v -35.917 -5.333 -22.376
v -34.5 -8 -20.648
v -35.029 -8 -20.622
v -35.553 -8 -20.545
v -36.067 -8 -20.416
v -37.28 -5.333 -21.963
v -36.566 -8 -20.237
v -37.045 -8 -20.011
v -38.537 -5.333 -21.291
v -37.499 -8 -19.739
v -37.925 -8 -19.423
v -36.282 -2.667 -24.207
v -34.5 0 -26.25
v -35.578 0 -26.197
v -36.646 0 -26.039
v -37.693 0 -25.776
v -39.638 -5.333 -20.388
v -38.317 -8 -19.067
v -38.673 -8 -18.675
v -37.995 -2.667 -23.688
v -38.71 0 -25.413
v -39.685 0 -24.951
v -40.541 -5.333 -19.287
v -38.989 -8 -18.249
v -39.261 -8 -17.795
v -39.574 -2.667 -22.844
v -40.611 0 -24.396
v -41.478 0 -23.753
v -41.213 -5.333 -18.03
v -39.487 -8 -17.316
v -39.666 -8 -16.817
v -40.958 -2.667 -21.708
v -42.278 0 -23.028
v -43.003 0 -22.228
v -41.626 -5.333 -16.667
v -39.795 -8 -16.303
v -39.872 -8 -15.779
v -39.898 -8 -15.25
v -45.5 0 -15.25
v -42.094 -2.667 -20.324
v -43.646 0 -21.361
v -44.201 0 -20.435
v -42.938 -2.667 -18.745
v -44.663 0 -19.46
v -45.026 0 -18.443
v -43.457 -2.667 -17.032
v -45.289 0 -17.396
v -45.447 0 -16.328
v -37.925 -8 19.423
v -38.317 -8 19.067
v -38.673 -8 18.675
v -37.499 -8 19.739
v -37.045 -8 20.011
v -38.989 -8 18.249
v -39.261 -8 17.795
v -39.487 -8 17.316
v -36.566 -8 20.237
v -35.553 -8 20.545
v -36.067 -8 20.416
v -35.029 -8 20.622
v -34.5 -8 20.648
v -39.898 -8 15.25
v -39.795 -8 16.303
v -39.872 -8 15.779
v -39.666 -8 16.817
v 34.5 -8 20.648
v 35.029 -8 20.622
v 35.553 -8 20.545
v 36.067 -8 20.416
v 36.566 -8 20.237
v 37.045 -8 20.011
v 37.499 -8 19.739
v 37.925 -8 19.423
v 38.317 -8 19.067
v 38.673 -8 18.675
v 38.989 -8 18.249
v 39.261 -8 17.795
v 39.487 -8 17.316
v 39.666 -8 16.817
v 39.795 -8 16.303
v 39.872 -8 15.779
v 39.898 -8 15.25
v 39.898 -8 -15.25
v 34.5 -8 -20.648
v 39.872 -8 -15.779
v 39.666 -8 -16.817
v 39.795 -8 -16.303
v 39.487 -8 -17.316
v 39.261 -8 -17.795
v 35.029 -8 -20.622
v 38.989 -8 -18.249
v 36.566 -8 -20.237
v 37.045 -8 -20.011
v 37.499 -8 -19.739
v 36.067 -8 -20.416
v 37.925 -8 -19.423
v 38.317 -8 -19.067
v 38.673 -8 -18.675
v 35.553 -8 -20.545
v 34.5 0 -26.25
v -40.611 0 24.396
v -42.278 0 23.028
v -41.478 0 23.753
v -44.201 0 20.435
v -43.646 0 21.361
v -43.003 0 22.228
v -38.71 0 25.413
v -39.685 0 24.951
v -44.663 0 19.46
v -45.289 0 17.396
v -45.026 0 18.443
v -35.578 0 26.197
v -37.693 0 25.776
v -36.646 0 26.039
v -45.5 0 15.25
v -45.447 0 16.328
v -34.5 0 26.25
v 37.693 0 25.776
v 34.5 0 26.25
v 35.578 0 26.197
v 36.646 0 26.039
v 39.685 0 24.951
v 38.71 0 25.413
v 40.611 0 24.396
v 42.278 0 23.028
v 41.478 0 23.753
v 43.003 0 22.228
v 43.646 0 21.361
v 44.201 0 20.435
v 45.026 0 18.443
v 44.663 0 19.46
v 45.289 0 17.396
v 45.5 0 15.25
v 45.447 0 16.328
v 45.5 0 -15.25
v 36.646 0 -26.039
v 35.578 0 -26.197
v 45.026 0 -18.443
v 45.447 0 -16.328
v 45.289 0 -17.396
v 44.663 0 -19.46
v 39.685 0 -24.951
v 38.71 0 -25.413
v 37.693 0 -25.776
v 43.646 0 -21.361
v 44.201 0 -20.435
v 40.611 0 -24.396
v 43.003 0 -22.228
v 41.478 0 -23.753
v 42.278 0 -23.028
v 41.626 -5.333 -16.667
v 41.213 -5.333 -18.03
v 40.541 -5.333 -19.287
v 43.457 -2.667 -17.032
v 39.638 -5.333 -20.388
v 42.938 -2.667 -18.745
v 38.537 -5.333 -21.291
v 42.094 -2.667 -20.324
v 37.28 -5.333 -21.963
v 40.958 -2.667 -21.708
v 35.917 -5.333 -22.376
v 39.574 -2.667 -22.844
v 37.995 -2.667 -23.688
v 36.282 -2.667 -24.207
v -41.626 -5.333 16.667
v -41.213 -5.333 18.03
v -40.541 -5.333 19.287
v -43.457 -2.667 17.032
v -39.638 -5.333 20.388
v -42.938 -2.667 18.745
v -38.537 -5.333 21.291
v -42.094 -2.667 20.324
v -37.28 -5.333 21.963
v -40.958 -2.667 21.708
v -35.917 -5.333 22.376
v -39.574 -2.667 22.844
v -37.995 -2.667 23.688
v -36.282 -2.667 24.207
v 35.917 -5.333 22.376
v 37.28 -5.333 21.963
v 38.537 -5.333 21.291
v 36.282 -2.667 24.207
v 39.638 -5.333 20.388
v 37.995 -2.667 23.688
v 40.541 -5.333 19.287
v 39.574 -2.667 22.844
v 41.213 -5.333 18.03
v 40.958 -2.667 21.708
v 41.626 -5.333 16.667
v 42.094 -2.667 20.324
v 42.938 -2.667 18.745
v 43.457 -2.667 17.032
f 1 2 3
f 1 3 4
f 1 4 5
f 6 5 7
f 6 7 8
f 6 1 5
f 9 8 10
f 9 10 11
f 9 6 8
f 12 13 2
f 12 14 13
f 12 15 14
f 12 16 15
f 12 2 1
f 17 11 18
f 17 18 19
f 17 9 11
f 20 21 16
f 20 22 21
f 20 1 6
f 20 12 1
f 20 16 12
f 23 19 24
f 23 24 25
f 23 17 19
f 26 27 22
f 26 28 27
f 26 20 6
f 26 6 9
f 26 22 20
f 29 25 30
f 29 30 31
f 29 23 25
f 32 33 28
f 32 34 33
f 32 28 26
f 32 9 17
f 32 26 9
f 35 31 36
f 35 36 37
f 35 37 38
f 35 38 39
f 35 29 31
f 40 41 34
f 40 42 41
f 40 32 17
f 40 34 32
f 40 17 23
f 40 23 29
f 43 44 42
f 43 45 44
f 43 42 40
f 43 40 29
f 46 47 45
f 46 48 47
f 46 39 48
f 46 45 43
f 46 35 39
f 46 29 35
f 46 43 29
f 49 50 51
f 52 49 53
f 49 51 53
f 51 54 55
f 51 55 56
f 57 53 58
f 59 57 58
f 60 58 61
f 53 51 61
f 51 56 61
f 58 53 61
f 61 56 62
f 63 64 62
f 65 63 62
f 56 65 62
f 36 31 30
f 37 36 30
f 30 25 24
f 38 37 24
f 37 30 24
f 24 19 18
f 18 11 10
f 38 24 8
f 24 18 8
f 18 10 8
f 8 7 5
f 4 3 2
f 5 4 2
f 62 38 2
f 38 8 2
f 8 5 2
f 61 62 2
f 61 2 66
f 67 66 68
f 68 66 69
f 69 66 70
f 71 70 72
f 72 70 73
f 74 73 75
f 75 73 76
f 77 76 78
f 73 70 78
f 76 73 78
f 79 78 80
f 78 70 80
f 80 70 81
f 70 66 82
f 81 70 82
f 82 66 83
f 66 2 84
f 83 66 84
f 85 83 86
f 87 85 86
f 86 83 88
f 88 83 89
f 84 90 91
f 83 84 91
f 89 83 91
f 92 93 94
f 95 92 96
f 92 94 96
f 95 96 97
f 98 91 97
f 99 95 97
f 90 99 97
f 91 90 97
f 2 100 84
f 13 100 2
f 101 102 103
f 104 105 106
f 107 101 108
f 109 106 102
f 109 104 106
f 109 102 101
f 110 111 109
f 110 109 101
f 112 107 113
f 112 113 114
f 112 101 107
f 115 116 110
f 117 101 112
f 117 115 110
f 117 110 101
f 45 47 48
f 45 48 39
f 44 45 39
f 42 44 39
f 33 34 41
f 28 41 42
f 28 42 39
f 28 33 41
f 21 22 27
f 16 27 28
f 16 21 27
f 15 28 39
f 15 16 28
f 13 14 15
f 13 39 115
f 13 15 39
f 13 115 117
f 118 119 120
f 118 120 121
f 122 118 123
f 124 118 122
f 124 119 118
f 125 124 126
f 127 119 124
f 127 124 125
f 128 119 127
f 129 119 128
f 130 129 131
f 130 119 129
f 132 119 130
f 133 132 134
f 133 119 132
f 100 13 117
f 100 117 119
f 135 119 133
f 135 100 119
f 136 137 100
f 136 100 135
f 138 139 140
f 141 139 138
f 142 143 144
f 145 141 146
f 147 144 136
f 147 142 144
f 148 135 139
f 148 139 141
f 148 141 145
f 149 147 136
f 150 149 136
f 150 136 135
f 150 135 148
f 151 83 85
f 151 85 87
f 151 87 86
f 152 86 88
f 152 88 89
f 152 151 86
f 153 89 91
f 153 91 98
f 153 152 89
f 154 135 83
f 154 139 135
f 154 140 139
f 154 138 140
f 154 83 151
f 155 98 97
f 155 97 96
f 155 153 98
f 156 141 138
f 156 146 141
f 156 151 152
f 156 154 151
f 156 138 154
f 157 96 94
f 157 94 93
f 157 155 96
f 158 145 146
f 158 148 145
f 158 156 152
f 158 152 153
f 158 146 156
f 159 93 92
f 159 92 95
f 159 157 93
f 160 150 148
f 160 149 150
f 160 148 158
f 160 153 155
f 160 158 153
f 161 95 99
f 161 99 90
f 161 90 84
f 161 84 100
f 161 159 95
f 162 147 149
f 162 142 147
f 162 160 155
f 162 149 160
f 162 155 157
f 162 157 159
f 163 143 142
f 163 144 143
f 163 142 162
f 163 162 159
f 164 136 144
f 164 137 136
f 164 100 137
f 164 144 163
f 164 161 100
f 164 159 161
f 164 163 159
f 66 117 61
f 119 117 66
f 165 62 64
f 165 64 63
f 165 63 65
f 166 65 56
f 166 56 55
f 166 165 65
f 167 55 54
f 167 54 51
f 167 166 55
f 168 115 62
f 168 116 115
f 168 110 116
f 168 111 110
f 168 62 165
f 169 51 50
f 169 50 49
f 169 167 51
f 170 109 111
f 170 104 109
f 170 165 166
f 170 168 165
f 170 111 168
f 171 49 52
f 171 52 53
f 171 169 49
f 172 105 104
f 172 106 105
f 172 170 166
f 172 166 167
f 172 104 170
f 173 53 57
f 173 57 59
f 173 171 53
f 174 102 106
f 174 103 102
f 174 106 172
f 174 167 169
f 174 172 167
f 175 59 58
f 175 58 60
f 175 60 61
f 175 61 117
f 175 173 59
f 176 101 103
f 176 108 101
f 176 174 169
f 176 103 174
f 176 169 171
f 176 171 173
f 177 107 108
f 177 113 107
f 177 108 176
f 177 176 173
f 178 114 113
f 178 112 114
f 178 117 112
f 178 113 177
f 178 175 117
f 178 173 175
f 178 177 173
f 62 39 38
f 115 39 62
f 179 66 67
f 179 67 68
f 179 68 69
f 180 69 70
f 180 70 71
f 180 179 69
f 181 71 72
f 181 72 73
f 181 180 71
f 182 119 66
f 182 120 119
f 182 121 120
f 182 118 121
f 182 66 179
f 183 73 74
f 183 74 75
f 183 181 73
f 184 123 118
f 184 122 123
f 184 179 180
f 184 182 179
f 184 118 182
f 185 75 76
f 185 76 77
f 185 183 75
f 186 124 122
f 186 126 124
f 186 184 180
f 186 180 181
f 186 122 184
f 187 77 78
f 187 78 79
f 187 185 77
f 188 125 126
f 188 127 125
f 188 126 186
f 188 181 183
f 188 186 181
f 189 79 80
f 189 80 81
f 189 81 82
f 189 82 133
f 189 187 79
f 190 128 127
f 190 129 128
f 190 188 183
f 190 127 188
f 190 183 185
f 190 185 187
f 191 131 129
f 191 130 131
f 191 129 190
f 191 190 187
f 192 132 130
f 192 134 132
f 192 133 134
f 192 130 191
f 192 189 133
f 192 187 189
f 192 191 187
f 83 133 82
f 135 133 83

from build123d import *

# Parameters (mm, degrees)
BOSS_EXTRUDE1_DEPTH = 8
BOSS_EXTRUDE1_DRAFT = -35


with BuildPart() as part:
    # Sketch1 → Boss-Extrude1 (with draft: the straight prism first)
    with BuildSketch(Plane(origin=(0, 0, 0), x_dir=(1, 0, 0), z_dir=(0, 1, 0))):
        with BuildLine():
            ThreePointArc((-34.5, 26.25), (-42.278174593, 23.028174593), (-45.5, 15.25))
            Line((-45.5, 15.25), (-45.5, -15.25))
            ThreePointArc((-45.5, -15.25), (-42.278174593, -23.028174593), (-34.5, -26.25))
            Line((-34.5, -26.25), (34.5, -26.25))
            ThreePointArc((34.5, -26.25), (42.278174593, -23.028174593), (45.5, -15.25))
            Line((45.5, -15.25), (45.5, 15.25))
            ThreePointArc((45.5, 15.25), (42.278174593, 23.028174593), (34.5, 26.25))
            Line((34.5, 26.25), (-34.5, 26.25))
        make_face()
    extrude(amount=-BOSS_EXTRUDE1_DEPTH)
    # Boss-Extrude1: the draft: its side faces are tilted about the plane it starts from
    boss_extrude1_sides = [part.faces().sort_by_distance(p)[0] for p in [
        (-42.278174593, -4, -23.028174593),
        (-45.5, -4, 0),
        (-42.278174593, -4, 23.028174593),
        (0, -4, 26.25),
        (42.278174593, -4, 23.028174593),
        (45.5, -4, 0),
        (42.278174593, -4, -23.028174593),
        (0, -4, -26.25),
    ]]
    draft(boss_extrude1_sides, Plane(origin=(0, 0, 0), x_dir=(1, 0, 0), z_dir=(0, 1, 0)), BOSS_EXTRUDE1_DRAFT)


solid = part.part
